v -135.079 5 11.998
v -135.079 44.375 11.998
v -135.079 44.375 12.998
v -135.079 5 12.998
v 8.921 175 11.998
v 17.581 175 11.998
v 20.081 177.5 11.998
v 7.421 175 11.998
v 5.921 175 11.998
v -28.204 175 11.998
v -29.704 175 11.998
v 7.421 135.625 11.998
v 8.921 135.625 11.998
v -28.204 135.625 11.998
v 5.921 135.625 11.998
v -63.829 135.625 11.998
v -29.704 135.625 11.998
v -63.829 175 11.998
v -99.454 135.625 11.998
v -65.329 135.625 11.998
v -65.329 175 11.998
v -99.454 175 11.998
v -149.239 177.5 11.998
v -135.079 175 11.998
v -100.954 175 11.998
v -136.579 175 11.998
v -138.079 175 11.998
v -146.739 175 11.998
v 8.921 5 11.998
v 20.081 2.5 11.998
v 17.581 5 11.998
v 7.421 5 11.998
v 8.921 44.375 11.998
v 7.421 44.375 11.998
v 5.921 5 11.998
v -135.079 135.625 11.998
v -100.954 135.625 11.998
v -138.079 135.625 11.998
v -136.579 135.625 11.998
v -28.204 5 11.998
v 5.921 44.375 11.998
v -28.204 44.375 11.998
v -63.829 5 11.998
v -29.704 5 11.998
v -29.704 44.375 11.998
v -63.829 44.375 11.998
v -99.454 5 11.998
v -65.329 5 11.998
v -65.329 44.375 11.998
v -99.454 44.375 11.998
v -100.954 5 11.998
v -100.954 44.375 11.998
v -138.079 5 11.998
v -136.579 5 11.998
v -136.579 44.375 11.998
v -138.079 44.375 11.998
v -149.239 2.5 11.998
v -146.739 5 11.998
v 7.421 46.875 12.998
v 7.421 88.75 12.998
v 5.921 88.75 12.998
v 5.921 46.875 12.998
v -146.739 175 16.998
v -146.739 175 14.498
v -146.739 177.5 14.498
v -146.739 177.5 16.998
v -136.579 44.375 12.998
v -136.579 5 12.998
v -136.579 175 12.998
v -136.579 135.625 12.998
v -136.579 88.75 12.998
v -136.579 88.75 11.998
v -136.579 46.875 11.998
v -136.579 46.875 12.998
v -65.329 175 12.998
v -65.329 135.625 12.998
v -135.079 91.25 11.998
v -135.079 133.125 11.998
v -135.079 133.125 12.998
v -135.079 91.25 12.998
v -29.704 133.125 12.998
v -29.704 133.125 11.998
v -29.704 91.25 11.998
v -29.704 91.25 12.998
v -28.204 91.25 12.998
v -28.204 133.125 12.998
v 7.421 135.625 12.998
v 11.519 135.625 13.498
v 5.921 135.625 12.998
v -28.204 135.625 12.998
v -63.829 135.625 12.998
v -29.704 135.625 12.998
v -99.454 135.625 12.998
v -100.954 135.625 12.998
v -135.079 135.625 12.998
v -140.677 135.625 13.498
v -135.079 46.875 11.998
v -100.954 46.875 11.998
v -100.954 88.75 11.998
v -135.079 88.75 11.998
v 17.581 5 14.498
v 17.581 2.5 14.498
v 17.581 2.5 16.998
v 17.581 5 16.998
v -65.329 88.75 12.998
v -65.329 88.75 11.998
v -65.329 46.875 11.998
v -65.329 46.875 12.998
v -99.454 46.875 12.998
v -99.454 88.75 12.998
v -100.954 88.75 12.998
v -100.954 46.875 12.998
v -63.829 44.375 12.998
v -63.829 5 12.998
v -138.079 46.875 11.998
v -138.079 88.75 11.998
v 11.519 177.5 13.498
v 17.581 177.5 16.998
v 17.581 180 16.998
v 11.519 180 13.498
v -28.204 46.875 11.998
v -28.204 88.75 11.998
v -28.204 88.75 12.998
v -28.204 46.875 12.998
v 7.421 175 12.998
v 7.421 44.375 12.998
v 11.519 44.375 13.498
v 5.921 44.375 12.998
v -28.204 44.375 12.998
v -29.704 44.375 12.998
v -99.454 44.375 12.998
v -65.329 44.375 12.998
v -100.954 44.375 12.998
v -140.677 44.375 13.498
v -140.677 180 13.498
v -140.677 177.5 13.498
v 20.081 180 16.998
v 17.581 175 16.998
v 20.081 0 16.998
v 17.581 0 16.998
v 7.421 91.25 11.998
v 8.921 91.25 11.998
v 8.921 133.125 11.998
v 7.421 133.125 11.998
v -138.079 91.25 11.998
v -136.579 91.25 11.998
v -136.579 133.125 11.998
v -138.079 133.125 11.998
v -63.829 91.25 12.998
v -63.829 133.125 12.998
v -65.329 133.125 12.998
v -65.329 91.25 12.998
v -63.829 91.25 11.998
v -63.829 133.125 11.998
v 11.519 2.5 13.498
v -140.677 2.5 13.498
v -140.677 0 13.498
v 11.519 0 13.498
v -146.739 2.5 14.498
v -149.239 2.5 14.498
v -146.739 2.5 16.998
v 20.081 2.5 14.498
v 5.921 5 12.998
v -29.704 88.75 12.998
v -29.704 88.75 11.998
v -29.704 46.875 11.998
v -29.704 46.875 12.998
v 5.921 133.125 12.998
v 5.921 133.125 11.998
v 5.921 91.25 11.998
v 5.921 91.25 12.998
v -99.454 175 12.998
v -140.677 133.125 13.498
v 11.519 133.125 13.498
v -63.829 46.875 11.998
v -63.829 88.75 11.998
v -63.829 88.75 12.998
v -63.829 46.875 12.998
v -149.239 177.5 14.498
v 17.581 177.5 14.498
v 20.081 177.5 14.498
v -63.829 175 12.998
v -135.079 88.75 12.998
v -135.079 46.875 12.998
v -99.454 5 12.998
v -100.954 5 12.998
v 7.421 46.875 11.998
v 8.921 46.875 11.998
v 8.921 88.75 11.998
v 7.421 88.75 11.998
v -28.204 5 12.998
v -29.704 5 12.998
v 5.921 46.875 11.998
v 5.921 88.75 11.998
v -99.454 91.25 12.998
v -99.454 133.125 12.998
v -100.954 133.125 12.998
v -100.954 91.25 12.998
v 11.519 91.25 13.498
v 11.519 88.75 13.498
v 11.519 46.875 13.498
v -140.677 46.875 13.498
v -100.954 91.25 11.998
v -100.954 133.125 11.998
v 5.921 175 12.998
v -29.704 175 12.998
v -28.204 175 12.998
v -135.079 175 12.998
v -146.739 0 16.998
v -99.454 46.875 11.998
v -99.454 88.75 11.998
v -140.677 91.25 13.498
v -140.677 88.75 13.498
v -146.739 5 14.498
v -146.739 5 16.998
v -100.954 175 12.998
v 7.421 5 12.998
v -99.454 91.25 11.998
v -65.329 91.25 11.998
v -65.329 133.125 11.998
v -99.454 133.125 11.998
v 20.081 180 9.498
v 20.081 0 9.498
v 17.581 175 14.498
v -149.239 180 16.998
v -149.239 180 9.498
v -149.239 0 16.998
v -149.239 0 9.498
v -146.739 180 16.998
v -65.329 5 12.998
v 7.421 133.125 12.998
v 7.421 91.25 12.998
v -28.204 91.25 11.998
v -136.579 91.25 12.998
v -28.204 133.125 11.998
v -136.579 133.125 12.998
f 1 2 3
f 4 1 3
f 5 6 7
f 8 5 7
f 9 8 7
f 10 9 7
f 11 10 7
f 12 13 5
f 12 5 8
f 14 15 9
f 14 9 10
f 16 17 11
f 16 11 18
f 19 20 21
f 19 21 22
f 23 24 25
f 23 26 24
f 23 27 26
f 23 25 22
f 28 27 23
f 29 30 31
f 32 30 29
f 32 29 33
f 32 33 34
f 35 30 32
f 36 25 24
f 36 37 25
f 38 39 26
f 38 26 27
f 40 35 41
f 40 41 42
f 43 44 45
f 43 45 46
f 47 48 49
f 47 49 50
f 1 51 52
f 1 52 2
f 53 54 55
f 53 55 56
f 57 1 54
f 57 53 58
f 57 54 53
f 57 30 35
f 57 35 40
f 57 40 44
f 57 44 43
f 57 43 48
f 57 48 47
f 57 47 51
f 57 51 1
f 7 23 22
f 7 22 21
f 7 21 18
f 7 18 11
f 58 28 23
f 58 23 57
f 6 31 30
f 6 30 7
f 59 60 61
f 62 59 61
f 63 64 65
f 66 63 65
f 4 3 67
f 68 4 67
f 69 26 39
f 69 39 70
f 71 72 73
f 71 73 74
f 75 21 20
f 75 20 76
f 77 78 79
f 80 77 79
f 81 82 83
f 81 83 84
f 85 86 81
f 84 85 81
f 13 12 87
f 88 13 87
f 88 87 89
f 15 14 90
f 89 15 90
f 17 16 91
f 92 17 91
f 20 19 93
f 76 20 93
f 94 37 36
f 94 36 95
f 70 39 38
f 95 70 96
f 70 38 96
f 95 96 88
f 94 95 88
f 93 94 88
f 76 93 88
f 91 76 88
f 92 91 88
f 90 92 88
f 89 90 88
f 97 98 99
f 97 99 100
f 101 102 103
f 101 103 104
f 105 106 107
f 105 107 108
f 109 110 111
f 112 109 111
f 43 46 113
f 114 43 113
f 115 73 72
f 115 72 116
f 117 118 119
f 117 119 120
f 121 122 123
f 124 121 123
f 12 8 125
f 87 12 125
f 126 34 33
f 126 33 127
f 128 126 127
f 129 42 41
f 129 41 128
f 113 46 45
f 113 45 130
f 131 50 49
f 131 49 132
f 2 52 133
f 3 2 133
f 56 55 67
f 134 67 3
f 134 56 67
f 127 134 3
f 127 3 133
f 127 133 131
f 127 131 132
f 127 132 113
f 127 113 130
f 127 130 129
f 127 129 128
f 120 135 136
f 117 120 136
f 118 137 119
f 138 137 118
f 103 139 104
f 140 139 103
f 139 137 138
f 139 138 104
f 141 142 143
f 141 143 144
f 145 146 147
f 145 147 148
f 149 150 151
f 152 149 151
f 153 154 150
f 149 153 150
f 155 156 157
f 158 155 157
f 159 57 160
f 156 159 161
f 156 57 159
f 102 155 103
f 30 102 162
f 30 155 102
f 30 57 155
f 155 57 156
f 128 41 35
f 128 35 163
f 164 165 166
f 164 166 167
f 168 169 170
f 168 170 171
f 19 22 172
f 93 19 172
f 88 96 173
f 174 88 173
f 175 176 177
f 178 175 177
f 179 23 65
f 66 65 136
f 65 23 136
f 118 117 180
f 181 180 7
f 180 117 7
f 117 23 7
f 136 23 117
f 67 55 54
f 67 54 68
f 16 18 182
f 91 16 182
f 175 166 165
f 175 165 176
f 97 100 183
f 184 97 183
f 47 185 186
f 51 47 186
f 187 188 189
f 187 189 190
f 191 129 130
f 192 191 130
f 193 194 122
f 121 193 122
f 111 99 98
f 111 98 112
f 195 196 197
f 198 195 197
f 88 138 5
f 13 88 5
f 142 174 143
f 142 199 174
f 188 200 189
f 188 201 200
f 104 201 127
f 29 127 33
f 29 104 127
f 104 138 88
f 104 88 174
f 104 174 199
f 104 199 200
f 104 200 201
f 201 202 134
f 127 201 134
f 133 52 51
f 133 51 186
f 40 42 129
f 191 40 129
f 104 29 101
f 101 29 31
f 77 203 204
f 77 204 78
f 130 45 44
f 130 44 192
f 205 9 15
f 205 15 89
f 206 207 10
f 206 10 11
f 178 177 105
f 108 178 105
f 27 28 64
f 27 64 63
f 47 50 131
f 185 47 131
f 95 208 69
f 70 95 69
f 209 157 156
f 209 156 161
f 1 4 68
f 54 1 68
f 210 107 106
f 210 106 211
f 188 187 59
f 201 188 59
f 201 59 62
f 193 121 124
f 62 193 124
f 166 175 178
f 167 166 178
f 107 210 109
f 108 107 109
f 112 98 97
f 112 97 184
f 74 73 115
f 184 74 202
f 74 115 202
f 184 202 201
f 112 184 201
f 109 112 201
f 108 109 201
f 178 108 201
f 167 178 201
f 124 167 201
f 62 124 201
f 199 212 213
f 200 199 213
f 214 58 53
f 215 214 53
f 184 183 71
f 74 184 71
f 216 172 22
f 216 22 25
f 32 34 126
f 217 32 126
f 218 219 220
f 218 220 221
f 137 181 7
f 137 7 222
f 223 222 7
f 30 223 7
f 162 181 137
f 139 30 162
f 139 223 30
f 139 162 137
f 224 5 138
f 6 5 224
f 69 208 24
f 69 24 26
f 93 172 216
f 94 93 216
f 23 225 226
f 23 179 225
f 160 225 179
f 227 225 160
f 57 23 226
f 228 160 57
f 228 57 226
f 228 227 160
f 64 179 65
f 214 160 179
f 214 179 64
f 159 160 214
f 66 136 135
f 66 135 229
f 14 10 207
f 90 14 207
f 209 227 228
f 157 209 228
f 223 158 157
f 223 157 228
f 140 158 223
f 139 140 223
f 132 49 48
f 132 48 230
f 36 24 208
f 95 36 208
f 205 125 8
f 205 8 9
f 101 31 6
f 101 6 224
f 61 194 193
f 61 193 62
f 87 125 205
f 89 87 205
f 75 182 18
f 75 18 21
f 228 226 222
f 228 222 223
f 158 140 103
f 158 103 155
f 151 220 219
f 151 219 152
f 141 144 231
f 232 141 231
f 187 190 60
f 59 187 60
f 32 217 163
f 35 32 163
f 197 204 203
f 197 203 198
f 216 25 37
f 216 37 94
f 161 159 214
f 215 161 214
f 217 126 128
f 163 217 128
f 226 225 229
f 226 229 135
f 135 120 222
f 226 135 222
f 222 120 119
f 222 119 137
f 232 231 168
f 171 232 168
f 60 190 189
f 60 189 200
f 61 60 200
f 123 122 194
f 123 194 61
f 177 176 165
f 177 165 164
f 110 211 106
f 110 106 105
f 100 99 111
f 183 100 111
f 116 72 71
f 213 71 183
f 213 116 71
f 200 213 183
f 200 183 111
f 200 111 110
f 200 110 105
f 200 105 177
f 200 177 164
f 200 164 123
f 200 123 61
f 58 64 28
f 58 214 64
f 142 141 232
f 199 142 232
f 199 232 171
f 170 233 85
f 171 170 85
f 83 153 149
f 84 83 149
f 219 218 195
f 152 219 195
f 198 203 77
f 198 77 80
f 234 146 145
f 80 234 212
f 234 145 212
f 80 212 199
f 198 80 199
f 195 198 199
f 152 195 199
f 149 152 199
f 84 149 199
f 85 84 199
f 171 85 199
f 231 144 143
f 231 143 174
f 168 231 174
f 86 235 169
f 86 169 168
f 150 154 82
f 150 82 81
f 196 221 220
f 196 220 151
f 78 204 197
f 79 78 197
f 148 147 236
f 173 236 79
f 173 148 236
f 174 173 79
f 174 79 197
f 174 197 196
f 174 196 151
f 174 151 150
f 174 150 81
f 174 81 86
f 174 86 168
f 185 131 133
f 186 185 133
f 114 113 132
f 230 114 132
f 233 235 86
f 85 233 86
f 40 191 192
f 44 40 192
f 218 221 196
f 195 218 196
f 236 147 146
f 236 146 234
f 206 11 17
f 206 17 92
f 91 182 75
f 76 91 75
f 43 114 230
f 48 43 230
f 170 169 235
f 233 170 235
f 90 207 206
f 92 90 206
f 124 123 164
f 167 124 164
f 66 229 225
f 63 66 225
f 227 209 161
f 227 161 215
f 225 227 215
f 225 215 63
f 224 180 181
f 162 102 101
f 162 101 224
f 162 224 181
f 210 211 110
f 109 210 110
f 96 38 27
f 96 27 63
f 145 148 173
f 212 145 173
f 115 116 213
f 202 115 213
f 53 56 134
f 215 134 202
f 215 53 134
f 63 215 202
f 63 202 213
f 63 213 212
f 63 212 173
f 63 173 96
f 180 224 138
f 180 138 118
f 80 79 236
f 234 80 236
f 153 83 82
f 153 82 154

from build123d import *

# Parameters (mm, degrees)
F1_DEPTH  = 180
F4_W      = 2.5
F4_H      = 4
F5_DEPTH  = 164
F6_W      = 2.5
F6_H      = 2.5
F7_DEPTH  = 7.5
F8_W      = 10
F8_H      = 2.5
F9_DEPTH  = 25
F10_W     = 1.5
F10_H     = 1
F11_DEPTH = 170


with BuildPart() as f1:
    # F0 (on Front) → F1 (new body)
    with BuildSketch(Plane.XZ):
        Polygon((-149.2392462472, 9.4979269803), (-64.5789922093, 9.4979269803), (20.0812618285, 9.4979269803), (20.0812618285, 11.9979269803), (17.5812618285, 11.9979269803), (17.5812618285, 14.4979269803), (20.0812618285, 14.4979269803), (20.0812618285, 16.9979269803), (17.5812618285, 16.9979269803), (8.9210077907, 11.9979269803), (-64.5789922093, 11.9979269803), (-138.0789922093, 11.9979269803), (-146.7392462472, 16.9979269803), (-149.2392462472, 16.9979269803), (-149.2392462472, 14.4979269803), (-146.7392462472, 14.4979269803), (-146.7392462472, 11.9979269803), (-149.2392462472, 11.9979269803), align=None)
    extrude(amount=-F1_DEPTH)

    # F4 (on offset) → F5 (join)
    with BuildSketch(Plane(origin=(-146.7392462472, 0, 0), x_dir=(0, -1, 0), z_dir=(-1, 0, 0))):
        with Locations((-178.75, 11.4979269803)):
            Rectangle(F4_W, F4_H)
        with Locations((-134.375, 11.4979269803)):
            Rectangle(F4_W, F4_H)
        with Locations((-90, 11.4979269803)):
            Rectangle(F4_W, F4_H)
        with Locations((-45.625, 11.4979269803)):
            Rectangle(F4_W, F4_H)
        with Locations((-1.25, 11.4979269803)):
            Rectangle(F4_W, F4_H)
    extrude(amount=-F5_DEPTH)

    # F6 (on face) → F7 (join)
    with BuildSketch(Plane(origin=(0, 0, 9.4979269803), x_dir=(1, 0, 0), z_dir=(0, 0, -1))):
        with Locations((-147.9892462472, -1.25)):
            Rectangle(F6_W, F6_H)
        with Locations((18.8312618285, -1.25)):
            Rectangle(F6_W, F6_H)
        with Locations((18.8312618285, -178.75)):
            Rectangle(F6_W, F6_H)
        with Locations((-147.9892462472, -178.75)):
            Rectangle(F6_W, F6_H)
    extrude(amount=-F7_DEPTH)

    # F8 (on face) → F9 (cut)
    with BuildSketch(Plane.XY.offset(11.9979269803)):
        with Locations((-141.7392462472, 3.75)):
            Rectangle(F8_W, F8_H)
        with Locations((-141.7392462472, 176.25)):
            Rectangle(F8_W, F8_H)
        with Locations((12.5812618285, 176.25)):
            Rectangle(F8_W, F8_H)
        with Locations((12.5812618285, 3.75)):
            Rectangle(F8_W, F8_H)
    extrude(amount=F9_DEPTH, mode=Mode.SUBTRACT)

    # F10 (on face) → F11 (join)
    with BuildSketch(Plane(origin=(0, 175, 0), x_dir=(-1, 0, 0), z_dir=(0, 1, 0))):
        with Locations((135.8289922093, 12.4979269803)):
            Rectangle(F10_W, F10_H)
        with Locations((100.2039922093, 12.4979269803)):
            Rectangle(F10_W, F10_H)
        with Locations((64.5789922093, 12.4979269803)):
            Rectangle(F10_W, F10_H)
        with Locations((28.9539922093, 12.4979269803)):
            Rectangle(F10_W, F10_H)
        with Locations((-6.6710077907, 12.4979269803)):
            Rectangle(F10_W, F10_H)
    extrude(amount=-F11_DEPTH)


solid = f1.part
